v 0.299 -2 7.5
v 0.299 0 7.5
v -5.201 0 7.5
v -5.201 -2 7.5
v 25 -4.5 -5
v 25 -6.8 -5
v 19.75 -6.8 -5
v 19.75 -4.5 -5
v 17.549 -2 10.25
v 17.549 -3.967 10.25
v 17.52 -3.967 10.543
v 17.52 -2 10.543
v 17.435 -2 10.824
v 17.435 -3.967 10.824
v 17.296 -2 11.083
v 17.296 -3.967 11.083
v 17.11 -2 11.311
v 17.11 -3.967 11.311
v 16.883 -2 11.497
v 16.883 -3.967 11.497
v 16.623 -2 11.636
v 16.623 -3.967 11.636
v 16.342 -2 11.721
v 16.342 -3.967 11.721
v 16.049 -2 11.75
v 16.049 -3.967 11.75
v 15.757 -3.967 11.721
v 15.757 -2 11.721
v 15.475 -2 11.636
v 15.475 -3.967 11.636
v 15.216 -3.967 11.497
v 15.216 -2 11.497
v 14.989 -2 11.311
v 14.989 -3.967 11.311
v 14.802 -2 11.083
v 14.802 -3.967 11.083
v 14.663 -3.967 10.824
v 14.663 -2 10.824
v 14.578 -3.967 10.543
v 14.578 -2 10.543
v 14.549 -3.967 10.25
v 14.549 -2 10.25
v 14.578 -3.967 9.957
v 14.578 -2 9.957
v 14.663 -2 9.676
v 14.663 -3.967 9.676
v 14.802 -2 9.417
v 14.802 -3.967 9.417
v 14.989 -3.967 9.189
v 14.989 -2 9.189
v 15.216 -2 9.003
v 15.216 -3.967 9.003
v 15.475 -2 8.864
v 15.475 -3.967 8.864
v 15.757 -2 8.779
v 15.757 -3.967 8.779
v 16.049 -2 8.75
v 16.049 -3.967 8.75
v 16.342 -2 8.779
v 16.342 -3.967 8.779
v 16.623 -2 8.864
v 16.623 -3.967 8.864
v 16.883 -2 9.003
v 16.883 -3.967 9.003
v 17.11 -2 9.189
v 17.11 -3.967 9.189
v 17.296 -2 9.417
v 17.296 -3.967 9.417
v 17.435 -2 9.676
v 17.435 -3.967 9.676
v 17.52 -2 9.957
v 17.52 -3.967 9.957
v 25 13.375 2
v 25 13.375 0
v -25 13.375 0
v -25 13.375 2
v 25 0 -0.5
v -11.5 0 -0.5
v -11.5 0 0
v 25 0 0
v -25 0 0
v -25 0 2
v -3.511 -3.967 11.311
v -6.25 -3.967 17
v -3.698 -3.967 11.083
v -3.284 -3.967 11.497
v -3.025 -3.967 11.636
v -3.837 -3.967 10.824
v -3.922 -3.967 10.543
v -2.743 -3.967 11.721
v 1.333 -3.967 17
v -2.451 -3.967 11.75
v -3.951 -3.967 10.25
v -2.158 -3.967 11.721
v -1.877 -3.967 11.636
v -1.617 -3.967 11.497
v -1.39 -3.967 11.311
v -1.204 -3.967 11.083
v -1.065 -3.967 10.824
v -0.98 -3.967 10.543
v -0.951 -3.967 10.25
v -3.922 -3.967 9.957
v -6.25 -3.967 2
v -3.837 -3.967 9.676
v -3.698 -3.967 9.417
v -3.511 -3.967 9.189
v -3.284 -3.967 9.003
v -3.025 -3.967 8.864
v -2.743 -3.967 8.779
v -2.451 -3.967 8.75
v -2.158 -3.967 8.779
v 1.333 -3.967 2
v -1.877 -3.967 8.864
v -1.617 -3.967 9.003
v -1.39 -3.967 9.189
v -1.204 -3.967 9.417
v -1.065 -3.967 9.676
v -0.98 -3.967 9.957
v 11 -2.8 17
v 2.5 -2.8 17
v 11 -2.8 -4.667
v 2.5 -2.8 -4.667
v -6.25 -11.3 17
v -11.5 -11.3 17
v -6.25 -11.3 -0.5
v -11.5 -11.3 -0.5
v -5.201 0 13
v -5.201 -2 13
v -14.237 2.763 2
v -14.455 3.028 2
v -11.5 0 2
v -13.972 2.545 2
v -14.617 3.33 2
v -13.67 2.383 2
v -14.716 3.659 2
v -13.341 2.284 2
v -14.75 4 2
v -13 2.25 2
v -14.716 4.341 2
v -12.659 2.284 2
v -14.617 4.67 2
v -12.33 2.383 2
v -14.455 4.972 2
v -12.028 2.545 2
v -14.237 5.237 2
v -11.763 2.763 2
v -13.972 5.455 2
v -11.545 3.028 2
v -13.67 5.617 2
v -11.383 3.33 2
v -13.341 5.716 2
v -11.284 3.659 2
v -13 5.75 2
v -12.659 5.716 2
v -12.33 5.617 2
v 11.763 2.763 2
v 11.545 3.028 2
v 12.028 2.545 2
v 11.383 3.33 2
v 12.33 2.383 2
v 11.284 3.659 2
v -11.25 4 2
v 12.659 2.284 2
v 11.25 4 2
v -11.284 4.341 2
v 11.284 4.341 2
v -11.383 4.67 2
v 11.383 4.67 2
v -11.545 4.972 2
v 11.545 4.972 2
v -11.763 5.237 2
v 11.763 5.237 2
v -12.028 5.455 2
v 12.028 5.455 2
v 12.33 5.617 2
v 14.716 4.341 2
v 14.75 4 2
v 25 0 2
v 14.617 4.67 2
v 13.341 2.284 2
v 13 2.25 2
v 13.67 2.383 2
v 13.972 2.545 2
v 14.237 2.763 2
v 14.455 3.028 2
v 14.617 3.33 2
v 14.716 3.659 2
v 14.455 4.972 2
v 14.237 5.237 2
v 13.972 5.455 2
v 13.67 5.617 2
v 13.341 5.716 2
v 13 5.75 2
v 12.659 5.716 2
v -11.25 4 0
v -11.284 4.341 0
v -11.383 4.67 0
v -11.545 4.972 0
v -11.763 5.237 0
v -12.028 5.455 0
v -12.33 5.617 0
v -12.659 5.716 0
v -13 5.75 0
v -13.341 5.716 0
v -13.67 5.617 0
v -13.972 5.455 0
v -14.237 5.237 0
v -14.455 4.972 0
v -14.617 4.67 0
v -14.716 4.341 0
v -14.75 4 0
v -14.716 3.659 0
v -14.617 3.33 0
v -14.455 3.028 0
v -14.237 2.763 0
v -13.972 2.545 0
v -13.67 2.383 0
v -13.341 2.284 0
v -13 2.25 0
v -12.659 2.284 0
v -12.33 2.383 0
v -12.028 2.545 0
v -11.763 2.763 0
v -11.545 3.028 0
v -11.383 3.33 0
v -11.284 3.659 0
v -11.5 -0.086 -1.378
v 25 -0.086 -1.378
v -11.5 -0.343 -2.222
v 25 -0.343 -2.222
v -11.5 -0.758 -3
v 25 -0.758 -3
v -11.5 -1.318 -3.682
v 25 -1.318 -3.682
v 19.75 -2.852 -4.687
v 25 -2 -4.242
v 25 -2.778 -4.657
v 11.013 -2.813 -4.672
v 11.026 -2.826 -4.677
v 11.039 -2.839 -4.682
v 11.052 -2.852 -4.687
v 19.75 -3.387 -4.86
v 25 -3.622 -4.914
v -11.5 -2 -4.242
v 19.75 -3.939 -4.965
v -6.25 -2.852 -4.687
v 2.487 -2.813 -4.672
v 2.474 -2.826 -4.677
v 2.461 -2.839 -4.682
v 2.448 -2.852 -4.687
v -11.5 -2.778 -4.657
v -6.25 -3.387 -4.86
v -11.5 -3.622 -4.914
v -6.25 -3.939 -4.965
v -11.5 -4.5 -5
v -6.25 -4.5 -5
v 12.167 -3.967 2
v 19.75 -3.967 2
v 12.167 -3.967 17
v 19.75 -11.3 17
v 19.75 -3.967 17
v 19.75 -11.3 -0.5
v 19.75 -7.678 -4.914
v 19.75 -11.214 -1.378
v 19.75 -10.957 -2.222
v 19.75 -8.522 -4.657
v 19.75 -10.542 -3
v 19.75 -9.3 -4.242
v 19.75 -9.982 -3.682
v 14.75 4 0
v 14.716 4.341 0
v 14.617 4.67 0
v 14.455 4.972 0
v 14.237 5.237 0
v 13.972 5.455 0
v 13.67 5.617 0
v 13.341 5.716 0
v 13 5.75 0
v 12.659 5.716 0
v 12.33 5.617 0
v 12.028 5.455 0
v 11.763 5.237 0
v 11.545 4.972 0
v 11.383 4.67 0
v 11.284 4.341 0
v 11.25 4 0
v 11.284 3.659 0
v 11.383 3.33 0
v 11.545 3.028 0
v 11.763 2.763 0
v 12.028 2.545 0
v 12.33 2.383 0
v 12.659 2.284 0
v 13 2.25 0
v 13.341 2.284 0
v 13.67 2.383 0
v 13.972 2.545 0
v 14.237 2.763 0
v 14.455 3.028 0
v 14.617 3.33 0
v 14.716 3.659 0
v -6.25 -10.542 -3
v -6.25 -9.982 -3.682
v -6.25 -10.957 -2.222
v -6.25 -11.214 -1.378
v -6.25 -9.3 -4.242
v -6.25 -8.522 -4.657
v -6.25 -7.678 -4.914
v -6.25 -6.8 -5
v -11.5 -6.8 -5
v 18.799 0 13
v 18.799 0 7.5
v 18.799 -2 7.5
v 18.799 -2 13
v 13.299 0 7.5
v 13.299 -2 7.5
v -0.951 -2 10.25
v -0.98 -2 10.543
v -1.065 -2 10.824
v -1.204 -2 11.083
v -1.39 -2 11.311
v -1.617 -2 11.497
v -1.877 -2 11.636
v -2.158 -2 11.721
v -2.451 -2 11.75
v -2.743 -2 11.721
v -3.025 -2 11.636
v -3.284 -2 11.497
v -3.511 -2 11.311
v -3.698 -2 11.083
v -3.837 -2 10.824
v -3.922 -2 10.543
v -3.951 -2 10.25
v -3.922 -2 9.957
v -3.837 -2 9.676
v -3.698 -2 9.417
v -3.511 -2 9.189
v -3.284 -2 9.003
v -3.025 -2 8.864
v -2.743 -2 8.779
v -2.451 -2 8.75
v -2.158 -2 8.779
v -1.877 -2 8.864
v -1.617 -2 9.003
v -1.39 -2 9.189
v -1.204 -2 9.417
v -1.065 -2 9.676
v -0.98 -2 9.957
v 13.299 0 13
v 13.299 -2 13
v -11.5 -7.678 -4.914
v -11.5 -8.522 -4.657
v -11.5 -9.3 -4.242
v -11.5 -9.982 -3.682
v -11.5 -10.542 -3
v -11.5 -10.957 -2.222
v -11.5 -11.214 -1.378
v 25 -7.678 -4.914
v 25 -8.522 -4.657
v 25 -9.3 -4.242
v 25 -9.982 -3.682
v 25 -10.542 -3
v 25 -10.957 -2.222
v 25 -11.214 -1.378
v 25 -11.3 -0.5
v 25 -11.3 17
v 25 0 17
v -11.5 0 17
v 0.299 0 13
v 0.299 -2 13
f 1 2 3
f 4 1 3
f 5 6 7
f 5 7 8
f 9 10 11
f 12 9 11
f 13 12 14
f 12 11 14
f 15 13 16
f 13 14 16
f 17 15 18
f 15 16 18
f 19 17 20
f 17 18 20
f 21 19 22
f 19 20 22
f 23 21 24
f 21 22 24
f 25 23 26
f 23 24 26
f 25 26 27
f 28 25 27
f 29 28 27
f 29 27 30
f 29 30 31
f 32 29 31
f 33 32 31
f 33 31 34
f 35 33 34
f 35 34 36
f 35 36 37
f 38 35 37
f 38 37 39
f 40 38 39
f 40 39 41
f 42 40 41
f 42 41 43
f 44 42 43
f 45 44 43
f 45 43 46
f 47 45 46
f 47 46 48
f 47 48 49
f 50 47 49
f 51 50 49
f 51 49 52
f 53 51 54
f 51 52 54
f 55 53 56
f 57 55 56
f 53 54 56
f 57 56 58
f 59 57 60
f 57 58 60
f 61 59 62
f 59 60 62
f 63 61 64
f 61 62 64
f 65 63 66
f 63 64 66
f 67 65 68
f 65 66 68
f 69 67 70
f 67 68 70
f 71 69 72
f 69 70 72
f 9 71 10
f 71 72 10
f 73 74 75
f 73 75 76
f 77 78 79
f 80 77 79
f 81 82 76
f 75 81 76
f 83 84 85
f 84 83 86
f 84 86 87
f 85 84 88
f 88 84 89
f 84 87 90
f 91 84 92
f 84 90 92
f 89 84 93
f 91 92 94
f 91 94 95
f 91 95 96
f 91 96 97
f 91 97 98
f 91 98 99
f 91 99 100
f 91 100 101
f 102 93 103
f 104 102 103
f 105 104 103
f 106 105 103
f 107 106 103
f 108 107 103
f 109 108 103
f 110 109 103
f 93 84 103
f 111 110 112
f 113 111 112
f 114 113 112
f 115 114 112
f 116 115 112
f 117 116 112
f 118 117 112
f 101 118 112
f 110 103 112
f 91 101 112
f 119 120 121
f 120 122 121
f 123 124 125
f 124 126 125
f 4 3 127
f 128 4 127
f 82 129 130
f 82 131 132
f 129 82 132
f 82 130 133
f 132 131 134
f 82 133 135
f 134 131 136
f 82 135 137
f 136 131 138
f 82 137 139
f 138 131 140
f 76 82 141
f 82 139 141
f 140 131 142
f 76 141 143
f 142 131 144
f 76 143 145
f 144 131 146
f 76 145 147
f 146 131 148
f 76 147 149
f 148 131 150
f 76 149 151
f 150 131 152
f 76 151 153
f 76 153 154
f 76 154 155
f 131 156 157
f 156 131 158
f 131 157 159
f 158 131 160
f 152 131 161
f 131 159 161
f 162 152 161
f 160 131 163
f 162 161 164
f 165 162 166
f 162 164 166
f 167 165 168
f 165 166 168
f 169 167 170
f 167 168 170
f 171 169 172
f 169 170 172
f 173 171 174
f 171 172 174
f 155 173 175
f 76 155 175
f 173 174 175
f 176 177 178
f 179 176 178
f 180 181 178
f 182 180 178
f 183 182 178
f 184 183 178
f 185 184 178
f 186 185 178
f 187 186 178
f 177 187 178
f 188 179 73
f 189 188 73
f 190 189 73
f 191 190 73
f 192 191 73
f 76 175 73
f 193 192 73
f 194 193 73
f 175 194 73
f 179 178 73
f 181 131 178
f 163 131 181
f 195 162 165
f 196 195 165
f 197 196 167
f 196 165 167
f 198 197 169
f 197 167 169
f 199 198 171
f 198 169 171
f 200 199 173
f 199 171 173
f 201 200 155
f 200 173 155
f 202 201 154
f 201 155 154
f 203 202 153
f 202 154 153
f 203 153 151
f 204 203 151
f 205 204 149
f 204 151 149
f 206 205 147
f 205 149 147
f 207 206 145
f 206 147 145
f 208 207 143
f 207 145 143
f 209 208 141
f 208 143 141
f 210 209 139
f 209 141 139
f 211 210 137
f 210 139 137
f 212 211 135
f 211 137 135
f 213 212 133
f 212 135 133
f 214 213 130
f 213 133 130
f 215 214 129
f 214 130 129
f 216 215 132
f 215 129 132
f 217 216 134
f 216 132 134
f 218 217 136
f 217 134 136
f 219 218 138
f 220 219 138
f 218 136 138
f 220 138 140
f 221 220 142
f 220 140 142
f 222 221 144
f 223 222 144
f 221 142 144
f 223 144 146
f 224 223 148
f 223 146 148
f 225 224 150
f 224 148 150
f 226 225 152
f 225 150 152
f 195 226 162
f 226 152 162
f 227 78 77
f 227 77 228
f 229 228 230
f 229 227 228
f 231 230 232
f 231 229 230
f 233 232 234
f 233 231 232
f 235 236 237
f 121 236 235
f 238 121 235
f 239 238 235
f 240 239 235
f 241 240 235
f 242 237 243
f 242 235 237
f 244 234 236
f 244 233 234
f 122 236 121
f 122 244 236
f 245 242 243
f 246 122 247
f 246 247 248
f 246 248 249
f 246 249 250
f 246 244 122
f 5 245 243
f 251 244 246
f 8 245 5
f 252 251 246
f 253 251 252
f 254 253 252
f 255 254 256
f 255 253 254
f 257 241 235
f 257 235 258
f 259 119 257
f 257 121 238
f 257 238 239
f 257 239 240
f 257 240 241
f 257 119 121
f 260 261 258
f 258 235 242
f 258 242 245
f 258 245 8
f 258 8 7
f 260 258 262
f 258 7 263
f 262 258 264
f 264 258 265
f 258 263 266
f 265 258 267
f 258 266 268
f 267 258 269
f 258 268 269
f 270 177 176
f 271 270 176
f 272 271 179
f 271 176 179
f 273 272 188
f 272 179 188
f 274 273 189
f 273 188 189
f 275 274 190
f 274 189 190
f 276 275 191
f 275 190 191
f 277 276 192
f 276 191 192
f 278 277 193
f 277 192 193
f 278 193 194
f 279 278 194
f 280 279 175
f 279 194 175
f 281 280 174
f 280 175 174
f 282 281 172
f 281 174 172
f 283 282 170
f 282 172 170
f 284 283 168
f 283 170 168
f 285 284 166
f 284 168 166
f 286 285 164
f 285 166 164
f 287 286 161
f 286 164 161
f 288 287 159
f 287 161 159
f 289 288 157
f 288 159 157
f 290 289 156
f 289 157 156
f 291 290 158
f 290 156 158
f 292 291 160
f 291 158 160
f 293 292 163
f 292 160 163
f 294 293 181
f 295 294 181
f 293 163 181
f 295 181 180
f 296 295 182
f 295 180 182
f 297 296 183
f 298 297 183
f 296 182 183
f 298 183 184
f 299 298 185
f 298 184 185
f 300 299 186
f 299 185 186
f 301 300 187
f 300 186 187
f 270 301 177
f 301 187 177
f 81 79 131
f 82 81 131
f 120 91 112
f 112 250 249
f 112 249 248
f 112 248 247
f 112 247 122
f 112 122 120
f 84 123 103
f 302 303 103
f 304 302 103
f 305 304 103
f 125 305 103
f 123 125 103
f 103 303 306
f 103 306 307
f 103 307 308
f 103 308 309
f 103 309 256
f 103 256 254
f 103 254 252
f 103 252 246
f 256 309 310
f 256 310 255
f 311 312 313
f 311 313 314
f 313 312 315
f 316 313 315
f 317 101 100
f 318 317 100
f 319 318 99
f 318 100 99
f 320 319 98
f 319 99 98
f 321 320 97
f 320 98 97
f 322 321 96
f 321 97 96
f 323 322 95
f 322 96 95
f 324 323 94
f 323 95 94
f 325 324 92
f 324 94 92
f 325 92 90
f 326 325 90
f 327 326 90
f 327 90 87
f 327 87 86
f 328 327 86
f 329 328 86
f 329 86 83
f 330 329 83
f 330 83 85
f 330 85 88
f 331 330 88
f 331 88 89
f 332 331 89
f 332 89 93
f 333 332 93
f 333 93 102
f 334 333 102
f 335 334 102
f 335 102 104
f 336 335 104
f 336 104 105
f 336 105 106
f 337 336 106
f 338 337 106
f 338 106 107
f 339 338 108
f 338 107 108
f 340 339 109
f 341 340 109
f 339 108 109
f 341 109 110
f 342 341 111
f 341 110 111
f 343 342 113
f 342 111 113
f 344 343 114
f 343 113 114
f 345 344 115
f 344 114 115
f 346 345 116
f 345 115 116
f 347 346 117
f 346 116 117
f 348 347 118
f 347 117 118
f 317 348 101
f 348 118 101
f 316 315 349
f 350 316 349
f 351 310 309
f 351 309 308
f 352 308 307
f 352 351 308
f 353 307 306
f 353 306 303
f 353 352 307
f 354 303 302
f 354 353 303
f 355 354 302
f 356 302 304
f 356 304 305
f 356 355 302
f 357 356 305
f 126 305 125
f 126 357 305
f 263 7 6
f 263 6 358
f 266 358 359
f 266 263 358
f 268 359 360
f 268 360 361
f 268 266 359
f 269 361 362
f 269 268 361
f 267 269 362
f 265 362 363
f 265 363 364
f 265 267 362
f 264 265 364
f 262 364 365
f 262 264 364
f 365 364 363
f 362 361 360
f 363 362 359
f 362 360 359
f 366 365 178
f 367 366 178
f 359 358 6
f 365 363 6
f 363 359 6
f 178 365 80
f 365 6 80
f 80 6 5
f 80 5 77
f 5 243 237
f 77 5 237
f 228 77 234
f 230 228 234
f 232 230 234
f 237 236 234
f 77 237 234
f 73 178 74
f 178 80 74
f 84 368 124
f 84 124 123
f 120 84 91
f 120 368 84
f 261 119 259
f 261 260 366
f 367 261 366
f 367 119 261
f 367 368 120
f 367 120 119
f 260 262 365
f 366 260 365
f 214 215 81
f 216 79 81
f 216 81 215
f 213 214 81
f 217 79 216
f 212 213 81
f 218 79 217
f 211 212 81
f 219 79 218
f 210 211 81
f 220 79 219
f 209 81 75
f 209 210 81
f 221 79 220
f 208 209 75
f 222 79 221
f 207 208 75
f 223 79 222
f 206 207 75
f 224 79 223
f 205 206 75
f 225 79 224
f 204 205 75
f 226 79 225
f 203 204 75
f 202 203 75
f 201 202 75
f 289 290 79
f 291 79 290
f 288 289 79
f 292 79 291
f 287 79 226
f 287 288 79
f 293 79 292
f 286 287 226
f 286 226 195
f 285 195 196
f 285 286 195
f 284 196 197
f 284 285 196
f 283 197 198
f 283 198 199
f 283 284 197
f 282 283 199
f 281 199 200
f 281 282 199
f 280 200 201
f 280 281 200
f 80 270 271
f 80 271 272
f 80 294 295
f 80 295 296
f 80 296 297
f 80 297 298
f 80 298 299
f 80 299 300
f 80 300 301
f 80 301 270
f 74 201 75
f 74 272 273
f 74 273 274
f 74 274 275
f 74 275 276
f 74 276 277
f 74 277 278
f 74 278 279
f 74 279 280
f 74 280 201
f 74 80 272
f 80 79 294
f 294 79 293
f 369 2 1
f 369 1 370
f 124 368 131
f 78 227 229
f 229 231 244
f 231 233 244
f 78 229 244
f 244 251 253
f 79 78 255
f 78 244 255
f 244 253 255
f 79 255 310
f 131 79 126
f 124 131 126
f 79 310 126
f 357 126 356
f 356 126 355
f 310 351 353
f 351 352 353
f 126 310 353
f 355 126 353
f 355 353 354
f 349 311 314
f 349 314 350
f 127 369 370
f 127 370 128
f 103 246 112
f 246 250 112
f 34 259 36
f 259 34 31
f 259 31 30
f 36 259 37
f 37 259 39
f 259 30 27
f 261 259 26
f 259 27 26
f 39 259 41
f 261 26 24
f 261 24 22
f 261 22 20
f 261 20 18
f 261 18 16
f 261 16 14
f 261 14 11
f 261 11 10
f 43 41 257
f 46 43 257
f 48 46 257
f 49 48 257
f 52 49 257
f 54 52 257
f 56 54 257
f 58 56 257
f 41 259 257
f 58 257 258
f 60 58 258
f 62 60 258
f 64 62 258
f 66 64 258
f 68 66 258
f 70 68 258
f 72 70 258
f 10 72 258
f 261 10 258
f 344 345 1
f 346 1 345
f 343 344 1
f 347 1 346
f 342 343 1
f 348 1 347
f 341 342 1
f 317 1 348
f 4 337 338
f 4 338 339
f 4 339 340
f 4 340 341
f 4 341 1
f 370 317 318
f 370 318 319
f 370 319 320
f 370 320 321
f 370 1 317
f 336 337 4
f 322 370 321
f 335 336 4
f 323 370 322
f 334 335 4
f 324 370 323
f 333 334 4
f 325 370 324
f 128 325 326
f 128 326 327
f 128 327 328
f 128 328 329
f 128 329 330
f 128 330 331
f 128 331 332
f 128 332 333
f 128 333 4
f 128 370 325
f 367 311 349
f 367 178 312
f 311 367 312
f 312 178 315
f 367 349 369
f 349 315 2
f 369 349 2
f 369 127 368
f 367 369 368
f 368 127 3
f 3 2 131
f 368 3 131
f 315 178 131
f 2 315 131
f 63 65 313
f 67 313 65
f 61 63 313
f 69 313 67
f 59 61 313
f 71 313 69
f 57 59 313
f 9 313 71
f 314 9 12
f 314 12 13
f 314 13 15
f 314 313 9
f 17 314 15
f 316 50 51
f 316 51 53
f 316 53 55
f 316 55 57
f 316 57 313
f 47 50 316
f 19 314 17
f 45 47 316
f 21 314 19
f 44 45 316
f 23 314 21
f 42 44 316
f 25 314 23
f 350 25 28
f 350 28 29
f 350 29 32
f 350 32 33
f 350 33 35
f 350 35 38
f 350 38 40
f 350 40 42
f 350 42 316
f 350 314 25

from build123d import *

# Parameters (mm, degrees)
F0_W           = 13.375
F0_H           = 2
F1_DEPTH       = 25
F2_R           = 1.75
F3_DEPTH       = 2
F4_W           = 11.3
F4_H           = 7
F5_DEPTH       = 25
F5_DEPTH_BACK  = 11.5
F6_W           = 26
F6_H           = 6.5
F7_DEPTH       = 7
F9_DEPTH       = 7
F11_DEPTH      = 19.75
F11_DEPTH_BACK = 6.25
F12_T1_DEPTH   = 27.75
F12_T3_DEPTH   = 27.75
F12_T5_DEPTH   = 59
F14_DEPTH      = 15
F15_W          = 5.5
F15_H          = 5.5
F16_DEPTH      = 2
F17_DEPTH      = 2
F18_D          = 3


# Not quite as in the source:
# - a fillet or chamfer that OpenCascade refuses, or shapes differently, is made with other operations: its cross-section is extruded or revolved along the edge and cut away or added


with BuildPart() as f1:
    # F0 (on Right) → F1 (new body, symmetric)
    with BuildSketch(Plane.YZ):
        with Locations((6.6875, 1)):
            Rectangle(F0_W, F0_H)
    extrude(amount=F1_DEPTH, both=True)

    # F2 (on face) → F3 (cut, through all)
    with BuildSketch(Plane.XY.offset(2)):
        with Locations((-13, 4)):
            Circle(F2_R)
        with Locations((13, 4)):
            Circle(F2_R)
    extrude(amount=-F3_DEPTH, mode=Mode.SUBTRACT)

    # F4 (on Right) → F5 (join, two sides)
    with BuildSketch(Plane.YZ) as f5_sk:
        with Locations((-5.65, -1.5)):
            Rectangle(F4_W, F4_H)
    extrude(amount=F5_DEPTH)
    extrude(f5_sk.sketch, amount=-F5_DEPTH_BACK)

    # F6 (on face) → F7 (cut, through all)
    with BuildSketch(Plane(origin=(0, 0, -5), x_dir=(1, 0, 0), z_dir=(0, 0, -1))):
        with Locations((6.75, 8.05)):
            Rectangle(F6_W, F6_H)
    extrude(amount=-F7_DEPTH, mode=Mode.SUBTRACT)

    # F8 (on face) → F9 (cut, through all)
    with BuildSketch(Plane(origin=(0, 0, -5), x_dir=(1, 0, 0), z_dir=(0, 0, -1))):
        Polygon((13, 4.8), (0.5, 4.8), (2.5, 2.8), (11, 2.8), align=None)
    extrude(amount=-F9_DEPTH, mode=Mode.SUBTRACT)

    # F10 (on Right) → F11 (cut, two sides)
    with BuildSketch(Plane.YZ) as f11_sk:
        Polygon((-4.8, -5), (-2.8, -5), (-4.8, 7), align=None)
    extrude(amount=F11_DEPTH, mode=Mode.SUBTRACT)
    extrude(f11_sk.sketch, amount=-F11_DEPTH_BACK, mode=Mode.SUBTRACT)

    # F12: fillet of radius 4.5 on 3 edges, made by hand

    # F12_s2 → F12_t1 (cut)
    with BuildSketch(Plane.YZ.offset(-22.75)):
        with BuildLine():
            ThreePointArc((-6.8, -5), (-9.9819805153, -3.6819805153), (-11.3, -0.5))
            Line((-11.3, -0.5), (-11.3, -5))
            Line((-11.3, -5), (-6.8, -5))
        make_face()
    extrude(amount=F12_T1_DEPTH, mode=Mode.SUBTRACT)

    # F12_s4 → F12_t3 (cut)
    with BuildSketch(Plane.YZ.offset(8.5)):
        with BuildLine():
            ThreePointArc((-6.8, -5), (-9.9819805153, -3.6819805153), (-11.3, -0.5))
            Line((-11.3, -0.5), (-11.3, -5))
            Line((-11.3, -5), (-6.8, -5))
        make_face()
    extrude(amount=F12_T3_DEPTH, mode=Mode.SUBTRACT)

    # F12_s6 → F12_t5 (cut)
    with BuildSketch(Plane.YZ.offset(-22.75)):
        with BuildLine():
            ThreePointArc((0, -0.5), (-1.3180194847, -3.6819805153), (-4.5, -5))
            Line((-4.5, -5), (0, -5))
            Line((0, -5), (0, -0.5))
        make_face()
    extrude(amount=F12_T5_DEPTH, mode=Mode.SUBTRACT)

    # F13 (on face) → F14 (join)
    with BuildSketch(Plane.XY.offset(2)):
        Polygon((25, 0), (-11.5, 0), (-11.5, -11.3), (-6.25, -11.3), (-6.25, -3.9666666667), (1.3333333333, -3.9666666667), (2.5, -2.8), (11, -2.8), (12.1666666667, -3.9666666667), (19.75, -3.9666666667), (19.75, -11.3), (25, -11.3), align=None)
    extrude(amount=F14_DEPTH)

    # F15 (on face) → F16 (join)
    with BuildSketch(Plane(origin=(0, 0, 0), x_dir=(-1, 0, 0), z_dir=(0, 1, 0))):
        with Locations((-16.04918, 10.25)):
            Rectangle(F15_W, F15_H)
        with Locations((2.45082, 10.25)):
            Rectangle(F15_W, F15_H)
    extrude(amount=-F16_DEPTH)

    # F15 (on face) → F17 (cut)
    with BuildSketch(Plane(origin=(0, 0, 0), x_dir=(-1, 0, 0), z_dir=(0, 1, 0))):
        with Locations((-16.04918, 10.25)):
            Rectangle(F15_W, F15_H)
        with Locations((2.45082, 10.25)):
            Rectangle(F15_W, F15_H)
    extrude(amount=-F17_DEPTH, mode=Mode.SUBTRACT)

    # F18 (through all)
    with Locations(Plane(origin=(0, 0, 0), x_dir=(-1, 0, 0), z_dir=(0, 1, 0))):
        with Locations((2.45082, 10.25), (-16.04918, 10.25)):
            Hole(F18_D / 2)


solid = f1.part
